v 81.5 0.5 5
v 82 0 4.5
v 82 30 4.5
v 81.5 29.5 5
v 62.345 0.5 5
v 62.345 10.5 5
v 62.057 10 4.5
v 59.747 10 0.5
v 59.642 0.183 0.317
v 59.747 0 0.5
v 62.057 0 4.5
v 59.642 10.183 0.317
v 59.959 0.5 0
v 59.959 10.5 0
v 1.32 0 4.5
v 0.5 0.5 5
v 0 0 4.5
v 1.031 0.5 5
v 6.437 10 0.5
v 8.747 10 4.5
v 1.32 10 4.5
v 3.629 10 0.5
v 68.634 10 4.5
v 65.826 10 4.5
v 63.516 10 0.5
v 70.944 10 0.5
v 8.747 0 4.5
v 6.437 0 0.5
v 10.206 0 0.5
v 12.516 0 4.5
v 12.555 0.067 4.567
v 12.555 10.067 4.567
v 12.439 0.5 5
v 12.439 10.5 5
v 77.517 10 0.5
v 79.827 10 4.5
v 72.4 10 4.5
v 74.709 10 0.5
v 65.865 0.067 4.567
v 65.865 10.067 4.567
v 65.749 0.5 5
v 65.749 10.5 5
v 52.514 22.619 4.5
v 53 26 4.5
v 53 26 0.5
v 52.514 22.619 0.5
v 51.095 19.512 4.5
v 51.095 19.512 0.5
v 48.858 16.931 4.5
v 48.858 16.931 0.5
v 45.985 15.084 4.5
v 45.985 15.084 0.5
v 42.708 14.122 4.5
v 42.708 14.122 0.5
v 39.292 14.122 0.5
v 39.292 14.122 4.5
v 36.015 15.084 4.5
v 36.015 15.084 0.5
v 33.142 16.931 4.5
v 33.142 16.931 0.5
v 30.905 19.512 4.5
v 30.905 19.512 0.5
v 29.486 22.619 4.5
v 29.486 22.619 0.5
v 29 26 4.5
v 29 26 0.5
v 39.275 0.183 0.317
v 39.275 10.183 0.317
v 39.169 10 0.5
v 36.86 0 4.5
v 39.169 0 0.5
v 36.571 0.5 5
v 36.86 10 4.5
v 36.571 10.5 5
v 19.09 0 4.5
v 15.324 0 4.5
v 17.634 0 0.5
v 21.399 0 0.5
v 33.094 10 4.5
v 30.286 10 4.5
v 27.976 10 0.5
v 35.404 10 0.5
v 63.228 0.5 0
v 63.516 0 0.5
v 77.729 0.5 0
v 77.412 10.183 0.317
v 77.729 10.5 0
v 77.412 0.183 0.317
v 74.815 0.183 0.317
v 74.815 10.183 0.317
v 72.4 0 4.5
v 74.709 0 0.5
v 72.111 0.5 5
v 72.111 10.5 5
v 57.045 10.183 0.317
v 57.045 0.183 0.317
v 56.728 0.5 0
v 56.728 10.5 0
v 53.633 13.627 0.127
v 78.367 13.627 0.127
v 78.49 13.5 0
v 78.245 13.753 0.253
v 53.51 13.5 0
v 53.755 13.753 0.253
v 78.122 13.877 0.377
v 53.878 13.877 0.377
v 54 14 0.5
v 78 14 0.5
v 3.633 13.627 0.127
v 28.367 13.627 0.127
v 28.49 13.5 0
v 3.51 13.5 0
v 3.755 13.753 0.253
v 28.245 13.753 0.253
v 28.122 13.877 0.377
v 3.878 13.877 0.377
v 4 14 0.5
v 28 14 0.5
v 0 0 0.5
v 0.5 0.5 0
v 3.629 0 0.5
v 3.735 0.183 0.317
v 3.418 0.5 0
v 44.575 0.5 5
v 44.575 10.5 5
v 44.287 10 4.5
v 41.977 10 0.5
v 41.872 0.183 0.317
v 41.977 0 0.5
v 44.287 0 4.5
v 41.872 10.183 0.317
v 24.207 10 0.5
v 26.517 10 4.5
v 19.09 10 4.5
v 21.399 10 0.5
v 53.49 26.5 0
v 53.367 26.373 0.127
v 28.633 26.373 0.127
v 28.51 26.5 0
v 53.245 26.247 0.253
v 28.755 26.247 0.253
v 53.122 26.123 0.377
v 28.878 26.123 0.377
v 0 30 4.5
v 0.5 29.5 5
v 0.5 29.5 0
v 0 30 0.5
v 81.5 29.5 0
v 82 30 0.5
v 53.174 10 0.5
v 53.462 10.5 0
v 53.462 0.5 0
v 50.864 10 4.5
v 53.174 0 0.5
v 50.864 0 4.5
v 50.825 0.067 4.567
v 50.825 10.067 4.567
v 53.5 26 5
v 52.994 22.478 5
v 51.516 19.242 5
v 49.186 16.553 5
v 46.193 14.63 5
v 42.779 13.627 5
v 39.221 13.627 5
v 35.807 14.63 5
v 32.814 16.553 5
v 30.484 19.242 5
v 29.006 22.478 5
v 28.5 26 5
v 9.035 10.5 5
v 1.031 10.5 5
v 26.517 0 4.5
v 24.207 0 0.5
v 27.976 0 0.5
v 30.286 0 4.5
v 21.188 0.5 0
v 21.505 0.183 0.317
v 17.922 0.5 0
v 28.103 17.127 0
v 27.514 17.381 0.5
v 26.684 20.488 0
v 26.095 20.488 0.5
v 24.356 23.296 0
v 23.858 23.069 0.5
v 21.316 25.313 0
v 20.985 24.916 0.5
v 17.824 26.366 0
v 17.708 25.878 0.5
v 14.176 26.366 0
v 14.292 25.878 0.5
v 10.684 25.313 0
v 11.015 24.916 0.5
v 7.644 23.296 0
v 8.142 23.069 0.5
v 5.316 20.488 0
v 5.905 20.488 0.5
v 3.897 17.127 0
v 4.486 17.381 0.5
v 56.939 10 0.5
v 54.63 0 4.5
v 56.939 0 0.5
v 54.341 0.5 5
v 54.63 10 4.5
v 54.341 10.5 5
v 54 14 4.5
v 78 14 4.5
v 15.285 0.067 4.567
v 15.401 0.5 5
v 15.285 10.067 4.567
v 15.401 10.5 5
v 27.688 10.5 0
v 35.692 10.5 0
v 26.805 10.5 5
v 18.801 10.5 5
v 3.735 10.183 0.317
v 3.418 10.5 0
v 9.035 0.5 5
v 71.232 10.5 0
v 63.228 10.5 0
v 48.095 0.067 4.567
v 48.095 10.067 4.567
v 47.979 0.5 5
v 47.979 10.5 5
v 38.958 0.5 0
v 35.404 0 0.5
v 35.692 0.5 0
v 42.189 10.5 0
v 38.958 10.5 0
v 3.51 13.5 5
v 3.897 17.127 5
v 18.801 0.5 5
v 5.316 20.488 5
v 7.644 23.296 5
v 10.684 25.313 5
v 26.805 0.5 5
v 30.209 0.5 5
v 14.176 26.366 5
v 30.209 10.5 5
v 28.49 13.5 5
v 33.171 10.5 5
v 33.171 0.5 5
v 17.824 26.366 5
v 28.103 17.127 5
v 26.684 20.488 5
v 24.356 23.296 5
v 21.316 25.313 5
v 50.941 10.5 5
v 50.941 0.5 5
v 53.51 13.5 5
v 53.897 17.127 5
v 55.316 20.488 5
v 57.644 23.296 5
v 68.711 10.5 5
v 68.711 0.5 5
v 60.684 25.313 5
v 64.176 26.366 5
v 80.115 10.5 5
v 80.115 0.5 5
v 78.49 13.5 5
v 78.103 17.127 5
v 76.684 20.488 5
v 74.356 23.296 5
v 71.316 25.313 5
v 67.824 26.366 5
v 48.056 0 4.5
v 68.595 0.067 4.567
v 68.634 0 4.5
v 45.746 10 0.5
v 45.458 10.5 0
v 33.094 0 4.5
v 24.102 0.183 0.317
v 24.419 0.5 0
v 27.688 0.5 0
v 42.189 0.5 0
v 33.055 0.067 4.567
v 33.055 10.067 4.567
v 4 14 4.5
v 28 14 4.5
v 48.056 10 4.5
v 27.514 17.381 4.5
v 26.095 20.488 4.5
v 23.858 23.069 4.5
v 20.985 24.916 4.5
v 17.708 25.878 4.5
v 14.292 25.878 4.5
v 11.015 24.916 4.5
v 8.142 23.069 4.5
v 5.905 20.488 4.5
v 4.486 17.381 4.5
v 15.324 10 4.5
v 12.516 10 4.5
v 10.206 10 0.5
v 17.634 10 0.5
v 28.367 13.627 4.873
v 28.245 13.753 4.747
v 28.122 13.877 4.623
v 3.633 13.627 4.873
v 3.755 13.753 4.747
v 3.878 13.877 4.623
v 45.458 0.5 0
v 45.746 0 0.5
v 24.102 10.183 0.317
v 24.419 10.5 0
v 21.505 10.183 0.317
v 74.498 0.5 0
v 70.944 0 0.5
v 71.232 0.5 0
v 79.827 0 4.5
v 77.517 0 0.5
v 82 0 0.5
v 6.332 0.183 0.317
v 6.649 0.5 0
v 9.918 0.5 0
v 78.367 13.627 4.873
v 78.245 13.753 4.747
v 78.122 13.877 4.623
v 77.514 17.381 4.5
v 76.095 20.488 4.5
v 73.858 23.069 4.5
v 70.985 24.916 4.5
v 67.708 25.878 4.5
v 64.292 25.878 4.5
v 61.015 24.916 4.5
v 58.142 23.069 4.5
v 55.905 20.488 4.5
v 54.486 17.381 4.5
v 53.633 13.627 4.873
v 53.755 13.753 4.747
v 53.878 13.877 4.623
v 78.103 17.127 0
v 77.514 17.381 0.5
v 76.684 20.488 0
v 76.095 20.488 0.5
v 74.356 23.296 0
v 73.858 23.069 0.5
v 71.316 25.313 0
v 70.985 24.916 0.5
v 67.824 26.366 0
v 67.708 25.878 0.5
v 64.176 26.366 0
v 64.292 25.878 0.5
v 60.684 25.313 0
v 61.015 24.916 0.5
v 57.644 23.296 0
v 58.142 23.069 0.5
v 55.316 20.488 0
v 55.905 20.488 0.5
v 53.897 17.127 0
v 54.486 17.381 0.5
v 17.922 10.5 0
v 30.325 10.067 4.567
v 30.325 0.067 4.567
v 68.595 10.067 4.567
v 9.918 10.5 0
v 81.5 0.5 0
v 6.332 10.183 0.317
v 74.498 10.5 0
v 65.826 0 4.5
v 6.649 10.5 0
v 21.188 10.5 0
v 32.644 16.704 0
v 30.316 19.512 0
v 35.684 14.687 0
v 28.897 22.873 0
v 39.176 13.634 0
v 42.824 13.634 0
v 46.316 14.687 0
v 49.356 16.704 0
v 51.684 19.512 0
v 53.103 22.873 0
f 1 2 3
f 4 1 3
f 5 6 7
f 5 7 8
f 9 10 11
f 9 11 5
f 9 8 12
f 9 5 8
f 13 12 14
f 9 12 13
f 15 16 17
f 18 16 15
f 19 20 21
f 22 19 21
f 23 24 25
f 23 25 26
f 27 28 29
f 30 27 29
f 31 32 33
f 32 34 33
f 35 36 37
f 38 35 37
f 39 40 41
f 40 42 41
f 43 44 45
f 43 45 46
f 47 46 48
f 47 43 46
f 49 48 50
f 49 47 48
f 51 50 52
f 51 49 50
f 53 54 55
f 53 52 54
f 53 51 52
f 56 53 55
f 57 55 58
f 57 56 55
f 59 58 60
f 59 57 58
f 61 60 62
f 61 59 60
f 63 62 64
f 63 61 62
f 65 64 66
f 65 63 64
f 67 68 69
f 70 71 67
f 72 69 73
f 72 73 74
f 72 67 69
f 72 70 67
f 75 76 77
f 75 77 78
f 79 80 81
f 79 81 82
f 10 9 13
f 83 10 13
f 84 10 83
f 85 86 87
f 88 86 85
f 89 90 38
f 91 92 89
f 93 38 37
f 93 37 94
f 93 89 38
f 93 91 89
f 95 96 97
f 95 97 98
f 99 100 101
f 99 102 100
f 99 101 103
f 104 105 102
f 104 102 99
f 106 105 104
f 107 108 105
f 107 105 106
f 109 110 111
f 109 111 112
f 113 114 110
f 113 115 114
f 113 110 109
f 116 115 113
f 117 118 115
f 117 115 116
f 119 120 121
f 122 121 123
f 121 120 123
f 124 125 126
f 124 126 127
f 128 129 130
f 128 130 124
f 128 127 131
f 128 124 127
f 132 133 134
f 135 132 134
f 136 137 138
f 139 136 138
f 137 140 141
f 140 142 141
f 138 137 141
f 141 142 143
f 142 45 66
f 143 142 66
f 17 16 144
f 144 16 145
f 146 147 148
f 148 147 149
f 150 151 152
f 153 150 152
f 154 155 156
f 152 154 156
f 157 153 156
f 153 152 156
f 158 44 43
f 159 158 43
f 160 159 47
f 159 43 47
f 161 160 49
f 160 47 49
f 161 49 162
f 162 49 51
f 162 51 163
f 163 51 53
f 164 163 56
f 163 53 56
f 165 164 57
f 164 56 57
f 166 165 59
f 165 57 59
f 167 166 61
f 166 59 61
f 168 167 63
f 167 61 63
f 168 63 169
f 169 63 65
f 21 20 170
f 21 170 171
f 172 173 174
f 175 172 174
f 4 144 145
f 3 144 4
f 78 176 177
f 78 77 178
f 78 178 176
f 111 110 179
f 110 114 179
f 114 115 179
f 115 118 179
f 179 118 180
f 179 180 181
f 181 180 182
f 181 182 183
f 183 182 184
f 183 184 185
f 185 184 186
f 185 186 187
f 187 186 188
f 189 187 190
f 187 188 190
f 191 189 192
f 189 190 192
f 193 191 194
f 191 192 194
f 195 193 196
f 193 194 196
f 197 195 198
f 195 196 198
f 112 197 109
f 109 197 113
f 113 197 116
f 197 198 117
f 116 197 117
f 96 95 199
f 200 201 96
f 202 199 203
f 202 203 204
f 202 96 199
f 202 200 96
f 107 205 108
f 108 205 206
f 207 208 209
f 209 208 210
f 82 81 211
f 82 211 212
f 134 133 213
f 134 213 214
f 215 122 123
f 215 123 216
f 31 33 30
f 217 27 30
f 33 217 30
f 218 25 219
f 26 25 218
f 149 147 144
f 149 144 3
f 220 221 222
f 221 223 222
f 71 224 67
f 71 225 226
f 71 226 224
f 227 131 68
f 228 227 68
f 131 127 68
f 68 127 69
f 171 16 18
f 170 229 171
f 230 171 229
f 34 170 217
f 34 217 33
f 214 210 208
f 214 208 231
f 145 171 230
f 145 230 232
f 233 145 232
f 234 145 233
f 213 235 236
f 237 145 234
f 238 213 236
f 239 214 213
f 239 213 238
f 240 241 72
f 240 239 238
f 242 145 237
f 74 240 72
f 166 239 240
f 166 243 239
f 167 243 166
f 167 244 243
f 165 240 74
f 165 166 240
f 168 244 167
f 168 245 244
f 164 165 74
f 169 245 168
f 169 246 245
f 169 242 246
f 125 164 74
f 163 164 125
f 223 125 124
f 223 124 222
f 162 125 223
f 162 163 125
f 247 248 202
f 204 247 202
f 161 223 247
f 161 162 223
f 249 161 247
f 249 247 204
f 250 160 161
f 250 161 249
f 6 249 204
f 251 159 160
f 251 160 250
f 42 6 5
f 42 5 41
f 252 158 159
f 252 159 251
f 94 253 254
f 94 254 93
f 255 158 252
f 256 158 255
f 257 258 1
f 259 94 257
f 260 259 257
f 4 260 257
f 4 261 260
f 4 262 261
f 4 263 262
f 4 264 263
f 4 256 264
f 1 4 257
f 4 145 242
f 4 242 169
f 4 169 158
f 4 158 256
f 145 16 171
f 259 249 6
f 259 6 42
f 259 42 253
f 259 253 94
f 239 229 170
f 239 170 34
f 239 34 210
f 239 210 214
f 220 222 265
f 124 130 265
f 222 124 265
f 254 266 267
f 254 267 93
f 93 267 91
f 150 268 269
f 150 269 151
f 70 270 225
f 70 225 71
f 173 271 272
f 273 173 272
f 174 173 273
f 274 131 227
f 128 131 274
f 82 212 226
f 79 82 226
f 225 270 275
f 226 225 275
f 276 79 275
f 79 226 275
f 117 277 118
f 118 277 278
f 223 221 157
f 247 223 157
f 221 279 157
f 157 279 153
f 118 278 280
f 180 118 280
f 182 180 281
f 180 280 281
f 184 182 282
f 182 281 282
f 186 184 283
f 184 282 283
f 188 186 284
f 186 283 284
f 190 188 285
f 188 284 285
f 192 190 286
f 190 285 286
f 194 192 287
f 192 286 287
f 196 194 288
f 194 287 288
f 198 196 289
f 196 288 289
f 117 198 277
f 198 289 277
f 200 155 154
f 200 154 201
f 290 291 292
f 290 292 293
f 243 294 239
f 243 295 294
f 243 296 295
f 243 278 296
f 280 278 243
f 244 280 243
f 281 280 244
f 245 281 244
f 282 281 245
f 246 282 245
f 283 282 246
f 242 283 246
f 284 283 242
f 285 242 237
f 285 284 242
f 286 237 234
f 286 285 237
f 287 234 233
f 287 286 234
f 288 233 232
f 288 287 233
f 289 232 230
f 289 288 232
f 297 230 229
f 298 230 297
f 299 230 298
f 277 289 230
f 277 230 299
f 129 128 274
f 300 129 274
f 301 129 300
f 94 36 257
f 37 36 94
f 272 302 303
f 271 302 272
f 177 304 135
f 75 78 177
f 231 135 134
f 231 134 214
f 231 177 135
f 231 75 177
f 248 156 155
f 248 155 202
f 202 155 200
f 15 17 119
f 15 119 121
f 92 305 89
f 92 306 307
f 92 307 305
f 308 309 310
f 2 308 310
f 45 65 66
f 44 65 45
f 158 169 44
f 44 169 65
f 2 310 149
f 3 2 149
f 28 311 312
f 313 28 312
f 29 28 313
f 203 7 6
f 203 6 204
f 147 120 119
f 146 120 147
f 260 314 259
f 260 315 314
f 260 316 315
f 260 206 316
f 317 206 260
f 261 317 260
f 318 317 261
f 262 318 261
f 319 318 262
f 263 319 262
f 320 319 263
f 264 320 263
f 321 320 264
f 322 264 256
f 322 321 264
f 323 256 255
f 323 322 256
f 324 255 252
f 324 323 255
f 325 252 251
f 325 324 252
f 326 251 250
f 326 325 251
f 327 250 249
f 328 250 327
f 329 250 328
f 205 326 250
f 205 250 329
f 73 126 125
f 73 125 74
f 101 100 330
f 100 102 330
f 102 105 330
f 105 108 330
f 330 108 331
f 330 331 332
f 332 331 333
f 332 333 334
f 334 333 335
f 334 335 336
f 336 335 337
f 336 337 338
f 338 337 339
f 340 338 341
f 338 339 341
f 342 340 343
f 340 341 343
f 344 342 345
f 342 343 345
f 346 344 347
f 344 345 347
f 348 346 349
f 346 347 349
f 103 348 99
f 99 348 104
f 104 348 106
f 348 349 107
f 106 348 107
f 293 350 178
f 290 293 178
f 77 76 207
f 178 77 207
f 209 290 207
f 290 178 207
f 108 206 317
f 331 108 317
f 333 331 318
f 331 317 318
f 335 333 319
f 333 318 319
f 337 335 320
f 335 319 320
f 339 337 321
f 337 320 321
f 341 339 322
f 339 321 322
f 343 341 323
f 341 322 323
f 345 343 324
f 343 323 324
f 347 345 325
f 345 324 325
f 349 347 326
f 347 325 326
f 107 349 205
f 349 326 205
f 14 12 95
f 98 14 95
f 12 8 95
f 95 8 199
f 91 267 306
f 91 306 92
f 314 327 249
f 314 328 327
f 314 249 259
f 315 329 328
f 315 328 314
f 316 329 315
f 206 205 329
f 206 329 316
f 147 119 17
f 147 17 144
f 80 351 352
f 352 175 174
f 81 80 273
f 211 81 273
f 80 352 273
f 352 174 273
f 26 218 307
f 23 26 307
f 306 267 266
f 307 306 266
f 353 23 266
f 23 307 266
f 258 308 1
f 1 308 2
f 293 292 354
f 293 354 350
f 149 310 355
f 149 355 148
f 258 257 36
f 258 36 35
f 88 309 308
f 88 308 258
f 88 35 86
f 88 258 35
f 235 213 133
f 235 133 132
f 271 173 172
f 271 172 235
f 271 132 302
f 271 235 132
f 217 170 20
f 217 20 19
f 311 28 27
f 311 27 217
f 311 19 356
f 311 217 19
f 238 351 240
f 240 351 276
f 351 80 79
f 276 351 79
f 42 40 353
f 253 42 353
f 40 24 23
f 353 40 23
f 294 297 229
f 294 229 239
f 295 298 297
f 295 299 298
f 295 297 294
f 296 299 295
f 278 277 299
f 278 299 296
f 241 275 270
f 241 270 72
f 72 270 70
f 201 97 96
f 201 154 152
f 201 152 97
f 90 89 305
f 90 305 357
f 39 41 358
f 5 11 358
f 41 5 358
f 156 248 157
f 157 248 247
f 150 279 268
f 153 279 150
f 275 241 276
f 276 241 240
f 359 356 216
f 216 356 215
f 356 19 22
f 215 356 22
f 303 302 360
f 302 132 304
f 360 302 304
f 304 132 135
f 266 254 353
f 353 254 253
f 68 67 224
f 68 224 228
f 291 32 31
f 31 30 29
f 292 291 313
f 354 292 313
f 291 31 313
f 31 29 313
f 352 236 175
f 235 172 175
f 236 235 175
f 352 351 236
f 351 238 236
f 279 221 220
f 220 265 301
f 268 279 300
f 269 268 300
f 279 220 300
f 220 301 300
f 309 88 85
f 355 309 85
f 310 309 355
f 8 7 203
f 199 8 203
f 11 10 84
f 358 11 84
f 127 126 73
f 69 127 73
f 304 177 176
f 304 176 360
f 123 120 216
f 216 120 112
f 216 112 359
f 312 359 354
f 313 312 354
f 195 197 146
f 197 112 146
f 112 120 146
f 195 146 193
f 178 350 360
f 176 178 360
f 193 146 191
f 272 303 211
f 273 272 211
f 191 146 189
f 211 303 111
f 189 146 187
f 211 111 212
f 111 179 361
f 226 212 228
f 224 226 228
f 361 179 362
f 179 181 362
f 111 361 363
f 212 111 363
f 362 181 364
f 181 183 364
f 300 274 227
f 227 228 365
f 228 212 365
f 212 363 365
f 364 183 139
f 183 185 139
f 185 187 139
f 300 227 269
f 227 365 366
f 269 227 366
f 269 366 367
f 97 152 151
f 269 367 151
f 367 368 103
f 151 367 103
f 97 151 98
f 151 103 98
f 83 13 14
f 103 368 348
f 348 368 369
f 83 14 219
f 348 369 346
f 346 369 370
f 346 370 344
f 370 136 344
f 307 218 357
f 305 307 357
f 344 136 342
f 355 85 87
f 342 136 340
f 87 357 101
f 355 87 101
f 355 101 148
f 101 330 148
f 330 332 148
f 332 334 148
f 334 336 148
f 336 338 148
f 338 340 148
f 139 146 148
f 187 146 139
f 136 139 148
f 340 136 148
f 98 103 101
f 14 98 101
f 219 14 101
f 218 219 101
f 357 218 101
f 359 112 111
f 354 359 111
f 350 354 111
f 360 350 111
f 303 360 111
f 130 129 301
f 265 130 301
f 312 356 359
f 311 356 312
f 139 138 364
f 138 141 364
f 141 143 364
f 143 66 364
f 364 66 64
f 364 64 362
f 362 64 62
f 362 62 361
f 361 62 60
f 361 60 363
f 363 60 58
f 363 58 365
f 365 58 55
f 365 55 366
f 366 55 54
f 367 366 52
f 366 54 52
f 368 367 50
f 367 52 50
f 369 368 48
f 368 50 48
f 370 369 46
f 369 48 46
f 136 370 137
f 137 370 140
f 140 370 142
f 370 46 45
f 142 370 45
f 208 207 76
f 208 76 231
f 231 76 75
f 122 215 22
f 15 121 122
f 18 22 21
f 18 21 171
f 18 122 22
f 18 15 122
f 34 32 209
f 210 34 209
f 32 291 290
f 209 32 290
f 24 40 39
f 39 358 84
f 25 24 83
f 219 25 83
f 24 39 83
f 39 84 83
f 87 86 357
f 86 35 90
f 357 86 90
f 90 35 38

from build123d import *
from OCP.BRepFilletAPI import BRepFilletAPI_MakeChamfer

# Parameters (mm, degrees)
SKETCH1_W           = 82
SKETCH1_H           = 30
BOSS_EXTRUDE1_DEPTH = 5
CUT_EXTRUDE1_DEPTH  = 10
CHAMFER1_SIZE       = 0.5
CHAMFER1_SIZE2      = 0.366025404
CUT_EXTRUDE3_REACH  = 89.459
CHAMFER3_SIZE       = 0.5


with BuildPart() as part:
    # Sketch1 → Boss-Extrude1 (new body)
    with BuildSketch(Plane.XY):
        with Locations((41, 15)):
            Rectangle(SKETCH1_W, SKETCH1_H)
    extrude(amount=BOSS_EXTRUDE1_DEPTH)

    # Sketch2 → Cut-Extrude1 (cut)
    with BuildSketch(Plane.XZ):
        Polygon((0.973292227, 5.1), (9.093205081, 5.1), (6.090983681, -0.1), (3.975513627, -0.1), align=None)
        Polygon((9.860043573, -0.1), (17.979956427, -0.1), (14.977735027, 5.1), (12.862264973, 5.1), align=None)
        Polygon((18.743292227, 5.1), (26.863205081, 5.1), (23.860983681, -0.1), (21.745513627, -0.1), align=None)
        Polygon((27.630043573, -0.1), (35.749956427, -0.1), (32.747735027, 5.1), (30.632264973, 5.1), align=None)
        Polygon((36.513292227, 5.1), (44.633205081, 5.1), (41.630983681, -0.1), (39.515513627, -0.1), align=None)
        Polygon((45.400043573, -0.1), (53.519956427, -0.1), (50.517735027, 5.1), (48.402264973, 5.1), align=None)
        Polygon((54.283292227, 5.1), (62.403205081, 5.1), (59.400983681, -0.1), (57.285513627, -0.1), align=None)
        Polygon((63.170043573, -0.1), (71.289956427, -0.1), (68.287735027, 5.1), (66.172264973, 5.1), align=None)
        Polygon((72.053292227, 5.1), (80.173205081, 5.1), (77.170983681, -0.1), (75.055513627, -0.1), align=None)
    extrude(amount=-CUT_EXTRUDE1_DEPTH, mode=Mode.SUBTRACT)

    # Chamfer1: one chamfer whose edges measure the first distance from different faces: ONE call of the kernel's chamfer builder (chamfer() names one face for all edges)
    chamfer1_edges_1 = [part.edges().sort_by_distance(p)[0] for p in [
        (31.69, 10, 5),
        (40.573248654, 10, 5),
        (49.46, 10, 5),
        (58.343248654, 10, 5),
        (8.033248654, 0, 0),
        (67.23, 10, 5),
        (19.805, 0, 0),
        (25.803248654, 0, 0),
        (37.575, 0, 0),
        (76.113248654, 10, 5),
        (43.573248654, 0, 0),
        (55.345, 0, 0),
        (61.343248654, 0, 0),
        (73.115, 0, 0),
        (79.614359354, 0, 0),
        (76.113248654, 10, 0),
        (67.23, 10, 0),
        (58.343248654, 10, 0),
        (49.46, 10, 0),
        (40.573248654, 10, 0),
        (31.69, 10, 0),
        (22.803248654, 10, 0),
        (13.92, 10, 0),
        (5.033248654, 10, 0),
        (10.92, 0, 5),
        (16.918248654, 0, 5),
        (28.69, 0, 5),
        (34.688248654, 0, 5),
        (46.46, 0, 5),
        (52.458248654, 0, 5),
        (64.23, 0, 5),
        (70.228248654, 0, 5),
        (81.057735027, 0, 5),
        (1.9588893, 0, 0),
        (5.033248654, 10, 5),
        (13.92, 10, 5),
        (0.515513627, 0, 5),
        (22.803248654, 10, 5),
    ]]
    chamfer1_edges_2 = [part.edges().sort_by_distance(p)[0] for p in [
        (48.344529946, 5, 5),
    ]]
    chamfer1_side_2 = [part.faces().sort_by_distance(p)[0] for p in [
        (46.901154273, 5, 2.5),
    ]]
    chamfer1_edges_3 = [part.edges().sort_by_distance(p)[0] for p in [
        (50.575470054, 5, 5),
    ]]
    chamfer1_side_3 = [part.faces().sort_by_distance(p)[0] for p in [
        (52.018845727, 5, 2.5),
    ]]
    chamfer1_edges_4 = [part.edges().sort_by_distance(p)[0] for p in [
        (66.114529946, 5, 5),
    ]]
    chamfer1_side_4 = [part.faces().sort_by_distance(p)[0] for p in [
        (64.671154273, 5, 2.5),
    ]]
    chamfer1_edges_5 = [part.edges().sort_by_distance(p)[0] for p in [
        (68.345470054, 5, 5),
    ]]
    chamfer1_side_5 = [part.faces().sort_by_distance(p)[0] for p in [
        (69.788845727, 5, 2.5),
    ]]
    chamfer1_edges_6 = [part.edges().sort_by_distance(p)[0] for p in [
        (77.228718708, 5, 0),
        (74.9977786, 5, 0),
        (59.458718708, 5, 0),
        (57.2277786, 5, 0),
        (41.688718708, 5, 0),
        (39.4577786, 5, 0),
        (23.918718708, 5, 0),
        (21.6877786, 5, 0),
        (6.148718708, 5, 0),
        (3.9177786, 5, 0),
    ]]
    chamfer1_side_6 = [part.faces().sort_by_distance(p)[0] for p in [
        (41.090558892, 17.128531177, 0),
    ]]
    chamfer1_edges_7 = [part.edges().sort_by_distance(p)[0] for p in [
        (12.804529946, 5, 5),
    ]]
    chamfer1_side_7 = [part.faces().sort_by_distance(p)[0] for p in [
        (11.361154273, 5, 2.5),
    ]]
    chamfer1_edges_8 = [part.edges().sort_by_distance(p)[0] for p in [
        (15.035470054, 5, 5),
    ]]
    chamfer1_side_8 = [part.faces().sort_by_distance(p)[0] for p in [
        (16.478845727, 5, 2.5),
    ]]
    chamfer1_edges_9 = [part.edges().sort_by_distance(p)[0] for p in [
        (30.574529946, 5, 5),
    ]]
    chamfer1_side_9 = [part.faces().sort_by_distance(p)[0] for p in [
        (29.131154273, 5, 2.5),
    ]]
    chamfer1_edges_10 = [part.edges().sort_by_distance(p)[0] for p in [
        (32.805470054, 5, 5),
    ]]
    chamfer1_side_10 = [part.faces().sort_by_distance(p)[0] for p in [
        (34.248845727, 5, 2.5),
    ]]
    chamfer1 = BRepFilletAPI_MakeChamfer(part.part.solid().wrapped)
    for e in chamfer1_edges_1:
        chamfer1.Add(CHAMFER1_SIZE, e.wrapped)
    for e in chamfer1_edges_2:
        chamfer1.Add(CHAMFER1_SIZE, CHAMFER1_SIZE2, e.wrapped, chamfer1_side_2[0].wrapped)  # the first distance lies on this face
    for e in chamfer1_edges_3:
        chamfer1.Add(CHAMFER1_SIZE, CHAMFER1_SIZE2, e.wrapped, chamfer1_side_3[0].wrapped)  # the first distance lies on this face
    for e in chamfer1_edges_4:
        chamfer1.Add(CHAMFER1_SIZE, CHAMFER1_SIZE2, e.wrapped, chamfer1_side_4[0].wrapped)  # the first distance lies on this face
    for e in chamfer1_edges_5:
        chamfer1.Add(CHAMFER1_SIZE, CHAMFER1_SIZE2, e.wrapped, chamfer1_side_5[0].wrapped)  # the first distance lies on this face
    for e in chamfer1_edges_6:
        chamfer1.Add(CHAMFER1_SIZE, CHAMFER1_SIZE2, e.wrapped, chamfer1_side_6[0].wrapped)  # the first distance lies on this face
    for e in chamfer1_edges_7:
        chamfer1.Add(CHAMFER1_SIZE, CHAMFER1_SIZE2, e.wrapped, chamfer1_side_7[0].wrapped)  # the first distance lies on this face
    for e in chamfer1_edges_8:
        chamfer1.Add(CHAMFER1_SIZE, CHAMFER1_SIZE2, e.wrapped, chamfer1_side_8[0].wrapped)  # the first distance lies on this face
    for e in chamfer1_edges_9:
        chamfer1.Add(CHAMFER1_SIZE, CHAMFER1_SIZE2, e.wrapped, chamfer1_side_9[0].wrapped)  # the first distance lies on this face
    for e in chamfer1_edges_10:
        chamfer1.Add(CHAMFER1_SIZE, CHAMFER1_SIZE2, e.wrapped, chamfer1_side_10[0].wrapped)  # the first distance lies on this face
    add(Compound.cast(chamfer1.Shape()), mode=Mode.REPLACE)

    # Sketch11 → Cut-Extrude3 (cut, up to next)
    with BuildSketch(Plane.XY.offset(5), mode=Mode.PRIVATE) as cut_extrude3_sk1:
        with BuildLine():
            Line((4, 14), (28, 14))
            ThreePointArc((28, 14), (16, 26), (4, 14))
        make_face()
    cut_extrude3_tool1 = extrude(cut_extrude3_sk1.sketch, amount=-CUT_EXTRUDE3_REACH, mode=Mode.PRIVATE) & part.part
    # Sketch11 → Cut-Extrude3 (cut, up to next)
    with BuildSketch(Plane.XY.offset(5), mode=Mode.PRIVATE) as cut_extrude3_sk2:
        with BuildLine():
            Line((29, 26), (53, 26))
            ThreePointArc((53, 26), (41, 14), (29, 26))
        make_face()
    cut_extrude3_tool2 = extrude(cut_extrude3_sk2.sketch, amount=-CUT_EXTRUDE3_REACH, mode=Mode.PRIVATE) & part.part
    # Sketch11 → Cut-Extrude3 (cut, up to next)
    with BuildSketch(Plane.XY.offset(5), mode=Mode.PRIVATE) as cut_extrude3_sk3:
        with BuildLine():
            Line((54, 14), (78, 14))
            ThreePointArc((78, 14), (66, 26), (54, 14))
        make_face()
    cut_extrude3_tool3 = extrude(cut_extrude3_sk3.sketch, amount=-CUT_EXTRUDE3_REACH, mode=Mode.PRIVATE) & part.part
    add(cut_extrude3_tool1.solids().sort_by_distance((16, 19.092958, 5))[0], mode=Mode.SUBTRACT)
    add(cut_extrude3_tool2.solids().sort_by_distance((41, 20.907042, 5))[0], mode=Mode.SUBTRACT)
    add(cut_extrude3_tool3.solids().sort_by_distance((66, 19.092958, 5))[0], mode=Mode.SUBTRACT)

    # Chamfer3
    chamfer3_edges = [part.edges().sort_by_distance(p)[0] for p in [
        (82, 15.25, 0),
        (0, 15.25, 0),
        (41, 30, 0),
        (0, 15.25, 5),
        (41, 30, 5),
        (41, 14, 5),
        (66, 14, 0),
        (66, 26, 0),
        (66, 14, 5),
        (66, 26, 5),
        (41, 14, 0),
        (41, 26, 0),
        (16, 14, 0),
        (16, 26, 0),
        (16, 14, 5),
        (16, 26, 5),
        (82, 15.25, 5),
    ]]
    chamfer(chamfer3_edges, length=CHAMFER3_SIZE)


solid = part.part
